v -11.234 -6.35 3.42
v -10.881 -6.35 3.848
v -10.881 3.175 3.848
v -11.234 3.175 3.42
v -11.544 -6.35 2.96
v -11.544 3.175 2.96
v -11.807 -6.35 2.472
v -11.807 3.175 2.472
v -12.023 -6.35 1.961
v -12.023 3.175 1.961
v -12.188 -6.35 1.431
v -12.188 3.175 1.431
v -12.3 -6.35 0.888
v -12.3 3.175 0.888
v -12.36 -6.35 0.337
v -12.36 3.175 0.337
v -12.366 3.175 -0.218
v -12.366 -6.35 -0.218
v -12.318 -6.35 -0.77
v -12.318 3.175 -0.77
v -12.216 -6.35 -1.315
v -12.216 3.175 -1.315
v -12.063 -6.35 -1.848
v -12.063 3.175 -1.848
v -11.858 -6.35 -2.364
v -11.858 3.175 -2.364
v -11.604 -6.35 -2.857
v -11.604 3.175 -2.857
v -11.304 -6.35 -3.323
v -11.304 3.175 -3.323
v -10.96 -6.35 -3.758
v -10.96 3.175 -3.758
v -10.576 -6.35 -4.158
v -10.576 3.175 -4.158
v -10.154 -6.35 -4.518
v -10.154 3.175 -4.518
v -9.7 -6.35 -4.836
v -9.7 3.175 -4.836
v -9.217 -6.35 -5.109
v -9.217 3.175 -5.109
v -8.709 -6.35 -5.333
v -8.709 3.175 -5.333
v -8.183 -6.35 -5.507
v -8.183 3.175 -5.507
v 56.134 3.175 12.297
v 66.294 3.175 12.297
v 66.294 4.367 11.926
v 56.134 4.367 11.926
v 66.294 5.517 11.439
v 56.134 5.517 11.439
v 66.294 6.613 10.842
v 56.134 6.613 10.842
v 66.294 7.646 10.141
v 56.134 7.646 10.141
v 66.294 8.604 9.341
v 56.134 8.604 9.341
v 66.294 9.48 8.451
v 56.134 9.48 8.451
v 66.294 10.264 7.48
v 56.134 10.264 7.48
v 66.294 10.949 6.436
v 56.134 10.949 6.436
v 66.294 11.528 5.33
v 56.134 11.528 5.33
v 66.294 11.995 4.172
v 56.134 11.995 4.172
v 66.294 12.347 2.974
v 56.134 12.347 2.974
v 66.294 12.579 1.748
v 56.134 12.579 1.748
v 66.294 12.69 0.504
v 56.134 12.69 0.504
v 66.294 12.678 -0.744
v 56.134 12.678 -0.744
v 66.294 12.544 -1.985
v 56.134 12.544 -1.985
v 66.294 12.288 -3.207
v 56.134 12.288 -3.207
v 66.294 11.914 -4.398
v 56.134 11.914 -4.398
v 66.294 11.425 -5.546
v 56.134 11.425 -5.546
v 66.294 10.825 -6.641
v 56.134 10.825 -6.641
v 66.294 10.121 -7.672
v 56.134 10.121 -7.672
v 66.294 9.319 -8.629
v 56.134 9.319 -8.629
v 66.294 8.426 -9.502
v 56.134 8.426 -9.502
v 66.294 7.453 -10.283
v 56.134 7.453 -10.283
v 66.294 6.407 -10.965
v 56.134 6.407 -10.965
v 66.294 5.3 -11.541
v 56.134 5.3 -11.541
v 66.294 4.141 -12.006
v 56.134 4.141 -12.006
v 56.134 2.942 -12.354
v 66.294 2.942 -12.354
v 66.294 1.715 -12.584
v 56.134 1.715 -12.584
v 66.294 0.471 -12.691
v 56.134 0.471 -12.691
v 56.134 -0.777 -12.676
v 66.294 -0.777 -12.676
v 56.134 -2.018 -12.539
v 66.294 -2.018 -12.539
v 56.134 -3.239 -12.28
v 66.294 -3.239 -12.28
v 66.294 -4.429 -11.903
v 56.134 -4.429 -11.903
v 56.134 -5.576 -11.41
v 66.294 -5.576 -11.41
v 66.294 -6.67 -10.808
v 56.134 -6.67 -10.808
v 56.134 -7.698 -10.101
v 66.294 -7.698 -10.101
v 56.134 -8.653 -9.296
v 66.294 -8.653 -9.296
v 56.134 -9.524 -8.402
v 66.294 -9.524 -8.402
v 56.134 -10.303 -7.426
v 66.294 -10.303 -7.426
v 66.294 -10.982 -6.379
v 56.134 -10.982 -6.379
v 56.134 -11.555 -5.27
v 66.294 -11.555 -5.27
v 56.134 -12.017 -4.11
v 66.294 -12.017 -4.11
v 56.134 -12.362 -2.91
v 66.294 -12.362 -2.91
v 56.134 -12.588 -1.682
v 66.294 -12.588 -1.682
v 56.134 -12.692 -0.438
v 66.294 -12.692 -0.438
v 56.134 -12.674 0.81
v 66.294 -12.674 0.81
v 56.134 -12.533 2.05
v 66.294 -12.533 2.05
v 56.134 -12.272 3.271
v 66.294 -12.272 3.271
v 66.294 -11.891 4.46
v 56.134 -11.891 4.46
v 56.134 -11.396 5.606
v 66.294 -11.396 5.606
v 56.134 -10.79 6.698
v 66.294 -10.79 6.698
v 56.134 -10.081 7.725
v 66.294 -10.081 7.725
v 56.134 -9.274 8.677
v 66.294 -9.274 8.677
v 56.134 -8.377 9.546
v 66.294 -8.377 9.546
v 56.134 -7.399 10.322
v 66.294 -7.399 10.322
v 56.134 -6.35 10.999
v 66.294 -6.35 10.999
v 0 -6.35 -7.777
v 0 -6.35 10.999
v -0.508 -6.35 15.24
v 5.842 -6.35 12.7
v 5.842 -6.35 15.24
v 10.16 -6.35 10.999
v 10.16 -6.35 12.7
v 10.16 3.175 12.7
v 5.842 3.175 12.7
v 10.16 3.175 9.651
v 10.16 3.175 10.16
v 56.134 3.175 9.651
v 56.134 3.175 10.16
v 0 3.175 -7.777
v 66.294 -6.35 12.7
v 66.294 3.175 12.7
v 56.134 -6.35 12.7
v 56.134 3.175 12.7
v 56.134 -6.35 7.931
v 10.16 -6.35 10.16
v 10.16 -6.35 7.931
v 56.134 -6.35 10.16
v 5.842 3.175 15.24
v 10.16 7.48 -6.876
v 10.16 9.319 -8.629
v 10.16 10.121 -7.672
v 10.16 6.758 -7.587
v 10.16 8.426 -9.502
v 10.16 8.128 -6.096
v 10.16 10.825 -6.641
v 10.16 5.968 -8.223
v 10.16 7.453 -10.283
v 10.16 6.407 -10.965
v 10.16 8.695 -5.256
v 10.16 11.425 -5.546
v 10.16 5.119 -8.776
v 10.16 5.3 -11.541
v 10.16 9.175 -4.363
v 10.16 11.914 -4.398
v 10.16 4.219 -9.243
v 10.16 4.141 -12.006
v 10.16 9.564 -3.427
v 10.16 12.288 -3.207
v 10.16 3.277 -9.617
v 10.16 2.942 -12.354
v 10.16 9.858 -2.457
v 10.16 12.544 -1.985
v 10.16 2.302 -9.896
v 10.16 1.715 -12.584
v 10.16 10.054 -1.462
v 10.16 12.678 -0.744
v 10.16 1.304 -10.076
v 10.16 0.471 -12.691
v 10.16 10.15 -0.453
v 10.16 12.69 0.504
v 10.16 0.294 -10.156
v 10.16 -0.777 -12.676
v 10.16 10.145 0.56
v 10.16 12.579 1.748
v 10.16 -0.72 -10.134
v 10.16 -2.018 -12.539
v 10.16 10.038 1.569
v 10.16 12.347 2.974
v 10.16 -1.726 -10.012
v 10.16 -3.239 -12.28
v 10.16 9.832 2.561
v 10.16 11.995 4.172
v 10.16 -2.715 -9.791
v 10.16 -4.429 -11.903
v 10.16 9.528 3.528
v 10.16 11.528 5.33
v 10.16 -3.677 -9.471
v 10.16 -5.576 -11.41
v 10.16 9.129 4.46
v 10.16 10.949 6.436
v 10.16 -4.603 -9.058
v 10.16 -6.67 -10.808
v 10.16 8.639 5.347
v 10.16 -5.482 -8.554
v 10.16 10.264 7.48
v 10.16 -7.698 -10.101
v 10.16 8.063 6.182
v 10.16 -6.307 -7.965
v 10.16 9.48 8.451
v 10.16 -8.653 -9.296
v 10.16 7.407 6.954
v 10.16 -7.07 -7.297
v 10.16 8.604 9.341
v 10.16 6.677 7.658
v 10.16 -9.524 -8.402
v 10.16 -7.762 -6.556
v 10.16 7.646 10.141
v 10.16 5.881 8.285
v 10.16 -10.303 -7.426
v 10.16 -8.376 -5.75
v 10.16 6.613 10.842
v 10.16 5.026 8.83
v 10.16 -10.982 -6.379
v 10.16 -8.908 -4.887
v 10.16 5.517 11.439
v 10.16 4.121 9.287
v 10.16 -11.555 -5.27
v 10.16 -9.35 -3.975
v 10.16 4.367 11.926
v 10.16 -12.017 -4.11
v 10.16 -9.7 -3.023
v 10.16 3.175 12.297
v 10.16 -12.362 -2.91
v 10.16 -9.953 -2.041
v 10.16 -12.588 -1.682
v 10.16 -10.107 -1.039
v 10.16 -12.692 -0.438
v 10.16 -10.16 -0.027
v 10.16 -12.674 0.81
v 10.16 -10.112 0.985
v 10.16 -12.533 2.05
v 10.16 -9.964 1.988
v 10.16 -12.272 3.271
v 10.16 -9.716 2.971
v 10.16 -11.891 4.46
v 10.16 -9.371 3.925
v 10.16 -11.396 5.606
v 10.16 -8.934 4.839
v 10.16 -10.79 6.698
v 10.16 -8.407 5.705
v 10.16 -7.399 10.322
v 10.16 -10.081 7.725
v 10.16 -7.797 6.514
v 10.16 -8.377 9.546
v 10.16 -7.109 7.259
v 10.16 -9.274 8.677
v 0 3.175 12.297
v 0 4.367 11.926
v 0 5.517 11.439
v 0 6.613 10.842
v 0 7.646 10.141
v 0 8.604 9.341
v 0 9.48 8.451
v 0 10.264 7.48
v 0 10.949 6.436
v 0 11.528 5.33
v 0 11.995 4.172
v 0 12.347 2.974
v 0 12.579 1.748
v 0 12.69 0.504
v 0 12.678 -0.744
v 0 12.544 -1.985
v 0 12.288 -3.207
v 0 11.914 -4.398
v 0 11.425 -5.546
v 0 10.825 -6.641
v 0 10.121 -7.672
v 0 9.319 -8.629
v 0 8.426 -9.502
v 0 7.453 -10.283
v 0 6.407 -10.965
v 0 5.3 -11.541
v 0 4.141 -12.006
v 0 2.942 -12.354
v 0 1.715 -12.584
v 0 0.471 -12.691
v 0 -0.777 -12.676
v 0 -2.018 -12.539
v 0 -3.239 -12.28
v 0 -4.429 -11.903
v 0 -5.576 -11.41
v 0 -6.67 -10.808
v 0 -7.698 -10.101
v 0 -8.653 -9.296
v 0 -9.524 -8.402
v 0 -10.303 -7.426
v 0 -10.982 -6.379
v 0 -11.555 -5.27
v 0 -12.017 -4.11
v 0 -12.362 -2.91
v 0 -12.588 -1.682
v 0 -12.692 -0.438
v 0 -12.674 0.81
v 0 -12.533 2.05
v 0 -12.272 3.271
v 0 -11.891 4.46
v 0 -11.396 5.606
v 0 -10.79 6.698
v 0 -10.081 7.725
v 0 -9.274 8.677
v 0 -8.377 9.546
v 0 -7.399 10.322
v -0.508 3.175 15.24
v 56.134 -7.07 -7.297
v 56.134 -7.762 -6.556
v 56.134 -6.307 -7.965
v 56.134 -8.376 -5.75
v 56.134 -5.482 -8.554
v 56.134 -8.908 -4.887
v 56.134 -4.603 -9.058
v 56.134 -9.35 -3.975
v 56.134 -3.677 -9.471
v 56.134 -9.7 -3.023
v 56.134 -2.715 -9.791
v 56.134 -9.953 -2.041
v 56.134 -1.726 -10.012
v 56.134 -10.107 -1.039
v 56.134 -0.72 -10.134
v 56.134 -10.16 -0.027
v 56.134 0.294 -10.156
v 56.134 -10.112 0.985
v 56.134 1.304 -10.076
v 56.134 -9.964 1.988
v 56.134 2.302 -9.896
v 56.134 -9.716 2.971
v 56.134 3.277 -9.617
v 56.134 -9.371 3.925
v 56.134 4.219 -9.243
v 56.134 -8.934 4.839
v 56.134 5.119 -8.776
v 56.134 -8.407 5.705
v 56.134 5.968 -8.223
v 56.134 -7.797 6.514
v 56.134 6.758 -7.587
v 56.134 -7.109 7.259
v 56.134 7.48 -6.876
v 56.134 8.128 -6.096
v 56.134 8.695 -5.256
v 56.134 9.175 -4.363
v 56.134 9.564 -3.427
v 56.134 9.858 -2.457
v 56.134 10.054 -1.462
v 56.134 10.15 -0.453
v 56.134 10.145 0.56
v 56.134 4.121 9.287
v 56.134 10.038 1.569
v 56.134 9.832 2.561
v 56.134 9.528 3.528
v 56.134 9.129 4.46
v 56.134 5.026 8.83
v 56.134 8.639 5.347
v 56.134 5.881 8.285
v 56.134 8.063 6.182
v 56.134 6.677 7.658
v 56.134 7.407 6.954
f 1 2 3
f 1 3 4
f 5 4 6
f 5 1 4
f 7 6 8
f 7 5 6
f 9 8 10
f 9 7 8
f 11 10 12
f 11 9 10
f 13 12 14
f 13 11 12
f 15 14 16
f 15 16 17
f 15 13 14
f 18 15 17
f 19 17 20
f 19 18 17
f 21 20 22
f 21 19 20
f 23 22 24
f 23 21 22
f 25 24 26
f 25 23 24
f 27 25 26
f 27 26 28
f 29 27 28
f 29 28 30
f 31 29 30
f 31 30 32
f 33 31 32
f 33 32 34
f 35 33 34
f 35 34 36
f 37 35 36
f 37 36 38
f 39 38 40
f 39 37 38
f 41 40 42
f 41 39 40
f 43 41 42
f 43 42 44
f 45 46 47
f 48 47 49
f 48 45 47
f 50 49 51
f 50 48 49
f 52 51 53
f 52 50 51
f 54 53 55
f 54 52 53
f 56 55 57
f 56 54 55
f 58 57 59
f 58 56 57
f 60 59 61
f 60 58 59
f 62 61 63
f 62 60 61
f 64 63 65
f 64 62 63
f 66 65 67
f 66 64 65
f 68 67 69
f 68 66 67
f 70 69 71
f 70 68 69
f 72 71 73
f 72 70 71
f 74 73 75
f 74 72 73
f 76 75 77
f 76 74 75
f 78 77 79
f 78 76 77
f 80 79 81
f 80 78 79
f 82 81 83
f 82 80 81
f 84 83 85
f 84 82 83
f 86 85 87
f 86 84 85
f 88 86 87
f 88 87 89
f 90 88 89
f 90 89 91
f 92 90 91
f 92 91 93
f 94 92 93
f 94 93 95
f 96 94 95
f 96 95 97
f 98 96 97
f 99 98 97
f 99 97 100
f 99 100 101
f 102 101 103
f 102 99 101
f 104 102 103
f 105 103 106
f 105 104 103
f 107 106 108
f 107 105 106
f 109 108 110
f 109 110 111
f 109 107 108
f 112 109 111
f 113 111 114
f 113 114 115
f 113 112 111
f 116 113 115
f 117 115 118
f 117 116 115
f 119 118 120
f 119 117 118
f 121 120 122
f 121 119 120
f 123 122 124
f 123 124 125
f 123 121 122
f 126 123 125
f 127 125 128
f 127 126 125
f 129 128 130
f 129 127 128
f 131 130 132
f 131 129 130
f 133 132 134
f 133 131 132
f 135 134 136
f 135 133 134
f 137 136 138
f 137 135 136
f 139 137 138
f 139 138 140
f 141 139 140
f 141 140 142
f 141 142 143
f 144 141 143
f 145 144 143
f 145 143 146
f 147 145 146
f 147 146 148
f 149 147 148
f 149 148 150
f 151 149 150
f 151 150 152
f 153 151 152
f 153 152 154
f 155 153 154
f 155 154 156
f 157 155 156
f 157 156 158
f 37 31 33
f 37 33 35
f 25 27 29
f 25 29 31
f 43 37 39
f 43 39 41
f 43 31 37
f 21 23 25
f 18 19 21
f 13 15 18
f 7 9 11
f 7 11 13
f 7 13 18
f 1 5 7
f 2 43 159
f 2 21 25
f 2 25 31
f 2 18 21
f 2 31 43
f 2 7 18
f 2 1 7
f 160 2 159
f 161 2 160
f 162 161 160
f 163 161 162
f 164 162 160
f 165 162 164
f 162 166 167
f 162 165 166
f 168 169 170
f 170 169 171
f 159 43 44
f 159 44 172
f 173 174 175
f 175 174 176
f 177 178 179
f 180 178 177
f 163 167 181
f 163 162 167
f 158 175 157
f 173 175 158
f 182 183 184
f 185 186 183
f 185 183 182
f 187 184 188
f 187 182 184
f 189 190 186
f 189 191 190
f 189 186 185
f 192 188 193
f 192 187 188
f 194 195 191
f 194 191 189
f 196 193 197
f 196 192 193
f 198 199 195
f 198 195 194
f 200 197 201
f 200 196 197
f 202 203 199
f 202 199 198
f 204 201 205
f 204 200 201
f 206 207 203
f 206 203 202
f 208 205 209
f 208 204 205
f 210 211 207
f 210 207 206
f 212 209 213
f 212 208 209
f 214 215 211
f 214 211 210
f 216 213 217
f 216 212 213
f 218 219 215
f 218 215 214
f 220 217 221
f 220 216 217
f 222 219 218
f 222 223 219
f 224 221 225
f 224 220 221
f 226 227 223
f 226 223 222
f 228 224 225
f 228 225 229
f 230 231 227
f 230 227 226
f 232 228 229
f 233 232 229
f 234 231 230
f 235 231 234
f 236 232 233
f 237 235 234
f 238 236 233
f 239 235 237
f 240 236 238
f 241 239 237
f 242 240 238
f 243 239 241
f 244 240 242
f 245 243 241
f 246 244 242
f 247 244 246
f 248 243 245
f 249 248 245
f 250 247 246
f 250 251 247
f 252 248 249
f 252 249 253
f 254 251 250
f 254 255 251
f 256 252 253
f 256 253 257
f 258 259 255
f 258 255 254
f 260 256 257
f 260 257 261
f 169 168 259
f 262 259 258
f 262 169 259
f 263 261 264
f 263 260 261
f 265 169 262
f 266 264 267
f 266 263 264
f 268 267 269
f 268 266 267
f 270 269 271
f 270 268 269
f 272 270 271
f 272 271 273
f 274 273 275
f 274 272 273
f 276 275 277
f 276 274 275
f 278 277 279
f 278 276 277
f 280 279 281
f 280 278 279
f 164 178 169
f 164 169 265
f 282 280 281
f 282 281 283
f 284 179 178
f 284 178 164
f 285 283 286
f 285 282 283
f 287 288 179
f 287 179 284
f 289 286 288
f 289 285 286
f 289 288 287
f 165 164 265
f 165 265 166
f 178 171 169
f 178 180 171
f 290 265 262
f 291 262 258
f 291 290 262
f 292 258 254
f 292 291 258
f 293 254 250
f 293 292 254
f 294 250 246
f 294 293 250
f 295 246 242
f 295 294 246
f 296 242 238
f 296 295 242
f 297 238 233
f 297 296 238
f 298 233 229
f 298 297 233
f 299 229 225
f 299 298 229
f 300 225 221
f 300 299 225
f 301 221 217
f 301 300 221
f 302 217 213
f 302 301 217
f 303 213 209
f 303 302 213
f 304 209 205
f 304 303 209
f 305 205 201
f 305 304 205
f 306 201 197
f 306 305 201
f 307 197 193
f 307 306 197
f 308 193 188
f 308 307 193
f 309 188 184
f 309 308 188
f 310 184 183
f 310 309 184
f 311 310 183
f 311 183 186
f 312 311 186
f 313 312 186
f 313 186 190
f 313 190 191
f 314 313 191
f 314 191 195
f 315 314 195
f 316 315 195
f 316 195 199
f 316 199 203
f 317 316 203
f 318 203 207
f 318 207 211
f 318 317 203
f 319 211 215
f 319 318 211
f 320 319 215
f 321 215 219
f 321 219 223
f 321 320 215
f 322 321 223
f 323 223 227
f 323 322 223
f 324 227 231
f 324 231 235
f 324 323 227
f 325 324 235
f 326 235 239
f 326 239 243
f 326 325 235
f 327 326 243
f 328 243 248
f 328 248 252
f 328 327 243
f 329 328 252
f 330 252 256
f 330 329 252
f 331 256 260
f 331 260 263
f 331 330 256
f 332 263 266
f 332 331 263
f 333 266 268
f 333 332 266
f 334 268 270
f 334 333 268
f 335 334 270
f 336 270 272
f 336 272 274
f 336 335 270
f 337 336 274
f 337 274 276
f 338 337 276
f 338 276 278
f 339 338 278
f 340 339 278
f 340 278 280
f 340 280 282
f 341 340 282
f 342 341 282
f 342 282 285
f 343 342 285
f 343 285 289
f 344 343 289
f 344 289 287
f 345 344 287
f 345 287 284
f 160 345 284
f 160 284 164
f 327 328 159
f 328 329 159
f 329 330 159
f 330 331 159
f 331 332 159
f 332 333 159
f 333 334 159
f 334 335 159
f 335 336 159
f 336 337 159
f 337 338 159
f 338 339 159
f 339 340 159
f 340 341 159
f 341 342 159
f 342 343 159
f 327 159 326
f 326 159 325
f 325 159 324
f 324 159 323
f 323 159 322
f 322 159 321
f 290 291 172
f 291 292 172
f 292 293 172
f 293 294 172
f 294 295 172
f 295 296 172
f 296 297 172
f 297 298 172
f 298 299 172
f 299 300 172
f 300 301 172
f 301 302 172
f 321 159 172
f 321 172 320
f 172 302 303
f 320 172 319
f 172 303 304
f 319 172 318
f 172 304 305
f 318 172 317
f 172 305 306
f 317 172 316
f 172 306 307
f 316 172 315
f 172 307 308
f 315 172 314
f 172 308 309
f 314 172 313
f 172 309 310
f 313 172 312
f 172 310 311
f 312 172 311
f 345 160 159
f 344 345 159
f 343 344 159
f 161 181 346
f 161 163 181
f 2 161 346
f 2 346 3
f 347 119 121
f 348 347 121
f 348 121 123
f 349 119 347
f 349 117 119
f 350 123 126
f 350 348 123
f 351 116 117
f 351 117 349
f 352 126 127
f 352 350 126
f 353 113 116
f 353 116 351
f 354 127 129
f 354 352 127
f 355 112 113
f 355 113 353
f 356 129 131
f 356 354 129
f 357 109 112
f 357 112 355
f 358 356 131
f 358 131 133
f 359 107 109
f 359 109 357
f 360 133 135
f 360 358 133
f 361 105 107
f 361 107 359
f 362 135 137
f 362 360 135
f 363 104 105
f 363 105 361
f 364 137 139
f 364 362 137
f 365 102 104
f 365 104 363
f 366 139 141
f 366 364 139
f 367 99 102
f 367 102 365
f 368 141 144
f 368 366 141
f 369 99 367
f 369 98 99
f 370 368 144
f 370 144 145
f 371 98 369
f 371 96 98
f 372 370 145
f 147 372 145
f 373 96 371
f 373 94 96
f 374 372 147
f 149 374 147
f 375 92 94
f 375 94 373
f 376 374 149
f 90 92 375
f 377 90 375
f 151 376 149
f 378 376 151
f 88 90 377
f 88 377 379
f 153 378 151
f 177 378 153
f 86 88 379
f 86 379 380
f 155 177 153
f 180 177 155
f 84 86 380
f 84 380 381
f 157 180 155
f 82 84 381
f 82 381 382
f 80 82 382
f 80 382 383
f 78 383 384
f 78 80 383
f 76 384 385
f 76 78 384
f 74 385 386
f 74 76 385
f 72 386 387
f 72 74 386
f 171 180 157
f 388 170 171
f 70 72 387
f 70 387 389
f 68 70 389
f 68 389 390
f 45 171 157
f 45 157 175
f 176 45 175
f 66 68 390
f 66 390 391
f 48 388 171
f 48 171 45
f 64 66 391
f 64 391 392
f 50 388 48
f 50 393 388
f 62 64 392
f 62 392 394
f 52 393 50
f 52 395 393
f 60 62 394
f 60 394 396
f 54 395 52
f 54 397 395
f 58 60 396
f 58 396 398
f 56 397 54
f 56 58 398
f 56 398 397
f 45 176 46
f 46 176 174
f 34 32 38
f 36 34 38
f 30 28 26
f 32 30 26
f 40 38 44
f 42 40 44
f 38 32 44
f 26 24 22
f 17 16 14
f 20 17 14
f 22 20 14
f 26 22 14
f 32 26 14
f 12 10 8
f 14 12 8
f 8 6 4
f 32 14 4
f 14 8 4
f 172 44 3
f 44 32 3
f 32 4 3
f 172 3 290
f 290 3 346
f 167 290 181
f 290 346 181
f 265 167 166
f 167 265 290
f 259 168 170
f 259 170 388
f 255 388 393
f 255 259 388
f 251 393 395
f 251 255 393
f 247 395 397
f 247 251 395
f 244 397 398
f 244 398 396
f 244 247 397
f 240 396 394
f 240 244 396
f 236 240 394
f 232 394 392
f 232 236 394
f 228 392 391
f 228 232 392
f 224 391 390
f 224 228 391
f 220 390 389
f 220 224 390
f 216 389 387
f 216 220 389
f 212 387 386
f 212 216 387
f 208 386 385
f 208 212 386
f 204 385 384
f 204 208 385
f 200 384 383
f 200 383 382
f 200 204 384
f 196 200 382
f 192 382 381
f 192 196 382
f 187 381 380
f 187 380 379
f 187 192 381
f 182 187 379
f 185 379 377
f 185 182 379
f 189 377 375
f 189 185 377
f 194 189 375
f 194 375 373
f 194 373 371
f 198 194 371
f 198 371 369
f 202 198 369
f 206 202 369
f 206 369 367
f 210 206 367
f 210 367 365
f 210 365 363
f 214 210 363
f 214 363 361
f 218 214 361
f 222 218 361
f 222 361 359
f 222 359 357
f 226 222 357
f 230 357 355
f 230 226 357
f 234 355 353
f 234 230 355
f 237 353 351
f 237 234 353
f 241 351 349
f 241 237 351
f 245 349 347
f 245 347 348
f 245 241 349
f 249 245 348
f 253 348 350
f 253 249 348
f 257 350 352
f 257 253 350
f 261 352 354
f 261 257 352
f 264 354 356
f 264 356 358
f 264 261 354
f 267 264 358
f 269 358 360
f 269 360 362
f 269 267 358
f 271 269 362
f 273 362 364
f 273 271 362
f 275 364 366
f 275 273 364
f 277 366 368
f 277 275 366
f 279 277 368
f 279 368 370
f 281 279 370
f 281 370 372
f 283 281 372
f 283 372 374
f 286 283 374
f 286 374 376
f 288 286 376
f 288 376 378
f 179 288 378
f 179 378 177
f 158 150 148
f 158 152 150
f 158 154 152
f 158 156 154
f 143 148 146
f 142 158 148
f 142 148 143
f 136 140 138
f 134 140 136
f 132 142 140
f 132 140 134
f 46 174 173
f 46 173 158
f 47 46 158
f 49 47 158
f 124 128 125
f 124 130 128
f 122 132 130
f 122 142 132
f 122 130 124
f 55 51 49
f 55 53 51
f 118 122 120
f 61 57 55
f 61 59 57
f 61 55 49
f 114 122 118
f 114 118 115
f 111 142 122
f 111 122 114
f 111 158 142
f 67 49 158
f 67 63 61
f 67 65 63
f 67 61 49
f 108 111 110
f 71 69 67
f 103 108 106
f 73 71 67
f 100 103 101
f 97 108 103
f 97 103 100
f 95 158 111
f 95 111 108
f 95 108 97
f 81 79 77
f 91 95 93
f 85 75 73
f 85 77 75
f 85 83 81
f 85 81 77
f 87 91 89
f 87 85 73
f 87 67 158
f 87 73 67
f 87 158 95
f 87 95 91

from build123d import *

# Parameters (mm, degrees)
F0_W     = 5.842
F0_H     = 12.7
F0_R     = 3.175
F2_DEPTH = 6.35
F3_DEPTH = 6.35
F4_DEPTH = 3.175
F5_DEPTH = 3.175


# Not quite as in the source:
# - the program builds the solid bodies; features that only make, move or delete a surface that nothing else refers to are left out


with BuildPart() as f1:
    # F0 (on Front) → F1 (revolve)
    with BuildSketch(Plane.XZ):
        Polygon((5.842, 12.7), (5.842, 0), (66.294, 0), (66.294, 12.7), (56.134, 12.7), (56.134, 10.16), (10.16, 10.16), (10.16, 12.7), align=None)
        with Locations((2.921, 6.35)):
            Rectangle(F0_W, F0_H)
    revolve(axis=Axis((33.147, 0, 0), (-1, 0, 0)))

    # F0 (on Front) → F2 (join)
    with BuildSketch(Plane.XZ):
        Polygon((5.842, 12.7), (5.842, 0), (66.294, 0), (66.294, 12.7), (56.134, 12.7), (56.134, 10.16), (10.16, 10.16), (10.16, 12.7), align=None)
        with BuildLine():
            ThreePointArc((-8.1826630726, -5.5069827884), (-3.1957909266, -4.5493385486), (-0.9398, 0))
            ThreePointArc((-0.9398, 0), (-4.5919612295, 5.3297205562), (-10.8806298187, 3.8475430269))
            ThreePointArc((-10.8806298187, 3.8475430269), (-12.1459778134, -1.5837270034), (-8.1826630726, -5.5069827884))
        make_face()
        with Locations((-6.6548, 0)):
            Circle(F0_R, mode=Mode.SUBTRACT)
        with Locations((2.921, 6.35)):
            Rectangle(F0_W, F0_H)
        with BuildLine():
            Line((5.842, 0), (0, 0))
            Line((0, 0), (-0.9398, 0))
            ThreePointArc((-0.9398, 0), (-3.1957909266, -4.5493385486), (-8.1826630726, -5.5069827884))
            Line((-8.1826630726, -5.5069827884), (5.842, -9.398))
            Line((5.842, -9.398), (5.842, 0))
        make_face()
        with Locations((-6.6548, 0)):
            Circle(F0_R)
    extrude(amount=F2_DEPTH)

    # F0 (on Front) → F3 (join)
    with BuildSketch(Plane.XZ):
        with BuildLine():
            Line((-0.9398, 0), (0, 0))
            Line((0, 0), (0, 12.7))
            Line((0, 12.7), (5.842, 12.7))
            Line((5.842, 12.7), (5.842, 15.24))
            Line((5.842, 15.24), (-0.508, 15.24))
            Line((-0.508, 15.24), (-10.8806298187, 3.8475430269))
            ThreePointArc((-10.8806298187, 3.8475430269), (-4.5919612295, 5.3297205562), (-0.9398, 0))
        make_face()
    extrude(amount=F3_DEPTH)

    # F0 (on Front) → F4 (join, symmetric)
    with BuildSketch(Plane.XZ):
        with BuildLine():
            Line((-0.9398, 0), (0, 0))
            Line((0, 0), (0, 12.7))
            Line((0, 12.7), (5.842, 12.7))
            Line((5.842, 12.7), (5.842, 15.24))
            Line((5.842, 15.24), (-0.508, 15.24))
            Line((-0.508, 15.24), (-10.8806298187, 3.8475430269))
            ThreePointArc((-10.8806298187, 3.8475430269), (-4.5919612295, 5.3297205562), (-0.9398, 0))
        make_face()
        with Locations((2.921, 6.35)):
            Rectangle(F0_W, F0_H)
        with BuildLine():
            Line((5.842, 0), (0, 0))
            Line((0, 0), (-0.9398, 0))
            ThreePointArc((-0.9398, 0), (-3.1957909266, -4.5493385486), (-8.1826630726, -5.5069827884))
            Line((-8.1826630726, -5.5069827884), (5.842, -9.398))
            Line((5.842, -9.398), (5.842, 0))
        make_face()
        Polygon((5.842, 12.7), (5.842, 0), (66.294, 0), (66.294, 12.7), (56.134, 12.7), (56.134, 10.16), (10.16, 10.16), (10.16, 12.7), align=None)
        with BuildLine():
            ThreePointArc((-8.1826630726, -5.5069827884), (-3.1957909266, -4.5493385486), (-0.9398, 0))
            ThreePointArc((-0.9398, 0), (-4.5919612295, 5.3297205562), (-10.8806298187, 3.8475430269))
            ThreePointArc((-10.8806298187, 3.8475430269), (-12.1459778134, -1.5837270034), (-8.1826630726, -5.5069827884))
        make_face()
        with Locations((-6.6548, 0)):
            Circle(F0_R, mode=Mode.SUBTRACT)
    extrude(amount=F4_DEPTH, both=True)

    # F0 (on Front) → F5 (join, symmetric)
    with BuildSketch(Plane.XZ):
        Polygon((5.842, 12.7), (5.842, 0), (66.294, 0), (66.294, 12.7), (56.134, 12.7), (56.134, 10.16), (10.16, 10.16), (10.16, 12.7), align=None)
        with BuildLine():
            ThreePointArc((-8.1826630726, -5.5069827884), (-3.1957909266, -4.5493385486), (-0.9398, 0))
            ThreePointArc((-0.9398, 0), (-4.5919612295, 5.3297205562), (-10.8806298187, 3.8475430269))
            ThreePointArc((-10.8806298187, 3.8475430269), (-12.1459778134, -1.5837270034), (-8.1826630726, -5.5069827884))
        make_face()
        with Locations((-6.6548, 0)):
            Circle(F0_R, mode=Mode.SUBTRACT)
        with BuildLine():
            Line((-0.9398, 0), (0, 0))
            Line((0, 0), (0, 12.7))
            Line((0, 12.7), (5.842, 12.7))
            Line((5.842, 12.7), (5.842, 15.24))
            Line((5.842, 15.24), (-0.508, 15.24))
            Line((-0.508, 15.24), (-10.8806298187, 3.8475430269))
            ThreePointArc((-10.8806298187, 3.8475430269), (-4.5919612295, 5.3297205562), (-0.9398, 0))
        make_face()
        with Locations((2.921, 6.35)):
            Rectangle(F0_W, F0_H)
        with BuildLine():
            Line((5.842, 0), (0, 0))
            Line((0, 0), (-0.9398, 0))
            ThreePointArc((-0.9398, 0), (-3.1957909266, -4.5493385486), (-8.1826630726, -5.5069827884))
            Line((-8.1826630726, -5.5069827884), (5.842, -9.398))
            Line((5.842, -9.398), (5.842, 0))
        make_face()
        with Locations((-6.6548, 0)):
            Circle(F0_R)
    extrude(amount=F5_DEPTH, both=True)


solid = f1.part
